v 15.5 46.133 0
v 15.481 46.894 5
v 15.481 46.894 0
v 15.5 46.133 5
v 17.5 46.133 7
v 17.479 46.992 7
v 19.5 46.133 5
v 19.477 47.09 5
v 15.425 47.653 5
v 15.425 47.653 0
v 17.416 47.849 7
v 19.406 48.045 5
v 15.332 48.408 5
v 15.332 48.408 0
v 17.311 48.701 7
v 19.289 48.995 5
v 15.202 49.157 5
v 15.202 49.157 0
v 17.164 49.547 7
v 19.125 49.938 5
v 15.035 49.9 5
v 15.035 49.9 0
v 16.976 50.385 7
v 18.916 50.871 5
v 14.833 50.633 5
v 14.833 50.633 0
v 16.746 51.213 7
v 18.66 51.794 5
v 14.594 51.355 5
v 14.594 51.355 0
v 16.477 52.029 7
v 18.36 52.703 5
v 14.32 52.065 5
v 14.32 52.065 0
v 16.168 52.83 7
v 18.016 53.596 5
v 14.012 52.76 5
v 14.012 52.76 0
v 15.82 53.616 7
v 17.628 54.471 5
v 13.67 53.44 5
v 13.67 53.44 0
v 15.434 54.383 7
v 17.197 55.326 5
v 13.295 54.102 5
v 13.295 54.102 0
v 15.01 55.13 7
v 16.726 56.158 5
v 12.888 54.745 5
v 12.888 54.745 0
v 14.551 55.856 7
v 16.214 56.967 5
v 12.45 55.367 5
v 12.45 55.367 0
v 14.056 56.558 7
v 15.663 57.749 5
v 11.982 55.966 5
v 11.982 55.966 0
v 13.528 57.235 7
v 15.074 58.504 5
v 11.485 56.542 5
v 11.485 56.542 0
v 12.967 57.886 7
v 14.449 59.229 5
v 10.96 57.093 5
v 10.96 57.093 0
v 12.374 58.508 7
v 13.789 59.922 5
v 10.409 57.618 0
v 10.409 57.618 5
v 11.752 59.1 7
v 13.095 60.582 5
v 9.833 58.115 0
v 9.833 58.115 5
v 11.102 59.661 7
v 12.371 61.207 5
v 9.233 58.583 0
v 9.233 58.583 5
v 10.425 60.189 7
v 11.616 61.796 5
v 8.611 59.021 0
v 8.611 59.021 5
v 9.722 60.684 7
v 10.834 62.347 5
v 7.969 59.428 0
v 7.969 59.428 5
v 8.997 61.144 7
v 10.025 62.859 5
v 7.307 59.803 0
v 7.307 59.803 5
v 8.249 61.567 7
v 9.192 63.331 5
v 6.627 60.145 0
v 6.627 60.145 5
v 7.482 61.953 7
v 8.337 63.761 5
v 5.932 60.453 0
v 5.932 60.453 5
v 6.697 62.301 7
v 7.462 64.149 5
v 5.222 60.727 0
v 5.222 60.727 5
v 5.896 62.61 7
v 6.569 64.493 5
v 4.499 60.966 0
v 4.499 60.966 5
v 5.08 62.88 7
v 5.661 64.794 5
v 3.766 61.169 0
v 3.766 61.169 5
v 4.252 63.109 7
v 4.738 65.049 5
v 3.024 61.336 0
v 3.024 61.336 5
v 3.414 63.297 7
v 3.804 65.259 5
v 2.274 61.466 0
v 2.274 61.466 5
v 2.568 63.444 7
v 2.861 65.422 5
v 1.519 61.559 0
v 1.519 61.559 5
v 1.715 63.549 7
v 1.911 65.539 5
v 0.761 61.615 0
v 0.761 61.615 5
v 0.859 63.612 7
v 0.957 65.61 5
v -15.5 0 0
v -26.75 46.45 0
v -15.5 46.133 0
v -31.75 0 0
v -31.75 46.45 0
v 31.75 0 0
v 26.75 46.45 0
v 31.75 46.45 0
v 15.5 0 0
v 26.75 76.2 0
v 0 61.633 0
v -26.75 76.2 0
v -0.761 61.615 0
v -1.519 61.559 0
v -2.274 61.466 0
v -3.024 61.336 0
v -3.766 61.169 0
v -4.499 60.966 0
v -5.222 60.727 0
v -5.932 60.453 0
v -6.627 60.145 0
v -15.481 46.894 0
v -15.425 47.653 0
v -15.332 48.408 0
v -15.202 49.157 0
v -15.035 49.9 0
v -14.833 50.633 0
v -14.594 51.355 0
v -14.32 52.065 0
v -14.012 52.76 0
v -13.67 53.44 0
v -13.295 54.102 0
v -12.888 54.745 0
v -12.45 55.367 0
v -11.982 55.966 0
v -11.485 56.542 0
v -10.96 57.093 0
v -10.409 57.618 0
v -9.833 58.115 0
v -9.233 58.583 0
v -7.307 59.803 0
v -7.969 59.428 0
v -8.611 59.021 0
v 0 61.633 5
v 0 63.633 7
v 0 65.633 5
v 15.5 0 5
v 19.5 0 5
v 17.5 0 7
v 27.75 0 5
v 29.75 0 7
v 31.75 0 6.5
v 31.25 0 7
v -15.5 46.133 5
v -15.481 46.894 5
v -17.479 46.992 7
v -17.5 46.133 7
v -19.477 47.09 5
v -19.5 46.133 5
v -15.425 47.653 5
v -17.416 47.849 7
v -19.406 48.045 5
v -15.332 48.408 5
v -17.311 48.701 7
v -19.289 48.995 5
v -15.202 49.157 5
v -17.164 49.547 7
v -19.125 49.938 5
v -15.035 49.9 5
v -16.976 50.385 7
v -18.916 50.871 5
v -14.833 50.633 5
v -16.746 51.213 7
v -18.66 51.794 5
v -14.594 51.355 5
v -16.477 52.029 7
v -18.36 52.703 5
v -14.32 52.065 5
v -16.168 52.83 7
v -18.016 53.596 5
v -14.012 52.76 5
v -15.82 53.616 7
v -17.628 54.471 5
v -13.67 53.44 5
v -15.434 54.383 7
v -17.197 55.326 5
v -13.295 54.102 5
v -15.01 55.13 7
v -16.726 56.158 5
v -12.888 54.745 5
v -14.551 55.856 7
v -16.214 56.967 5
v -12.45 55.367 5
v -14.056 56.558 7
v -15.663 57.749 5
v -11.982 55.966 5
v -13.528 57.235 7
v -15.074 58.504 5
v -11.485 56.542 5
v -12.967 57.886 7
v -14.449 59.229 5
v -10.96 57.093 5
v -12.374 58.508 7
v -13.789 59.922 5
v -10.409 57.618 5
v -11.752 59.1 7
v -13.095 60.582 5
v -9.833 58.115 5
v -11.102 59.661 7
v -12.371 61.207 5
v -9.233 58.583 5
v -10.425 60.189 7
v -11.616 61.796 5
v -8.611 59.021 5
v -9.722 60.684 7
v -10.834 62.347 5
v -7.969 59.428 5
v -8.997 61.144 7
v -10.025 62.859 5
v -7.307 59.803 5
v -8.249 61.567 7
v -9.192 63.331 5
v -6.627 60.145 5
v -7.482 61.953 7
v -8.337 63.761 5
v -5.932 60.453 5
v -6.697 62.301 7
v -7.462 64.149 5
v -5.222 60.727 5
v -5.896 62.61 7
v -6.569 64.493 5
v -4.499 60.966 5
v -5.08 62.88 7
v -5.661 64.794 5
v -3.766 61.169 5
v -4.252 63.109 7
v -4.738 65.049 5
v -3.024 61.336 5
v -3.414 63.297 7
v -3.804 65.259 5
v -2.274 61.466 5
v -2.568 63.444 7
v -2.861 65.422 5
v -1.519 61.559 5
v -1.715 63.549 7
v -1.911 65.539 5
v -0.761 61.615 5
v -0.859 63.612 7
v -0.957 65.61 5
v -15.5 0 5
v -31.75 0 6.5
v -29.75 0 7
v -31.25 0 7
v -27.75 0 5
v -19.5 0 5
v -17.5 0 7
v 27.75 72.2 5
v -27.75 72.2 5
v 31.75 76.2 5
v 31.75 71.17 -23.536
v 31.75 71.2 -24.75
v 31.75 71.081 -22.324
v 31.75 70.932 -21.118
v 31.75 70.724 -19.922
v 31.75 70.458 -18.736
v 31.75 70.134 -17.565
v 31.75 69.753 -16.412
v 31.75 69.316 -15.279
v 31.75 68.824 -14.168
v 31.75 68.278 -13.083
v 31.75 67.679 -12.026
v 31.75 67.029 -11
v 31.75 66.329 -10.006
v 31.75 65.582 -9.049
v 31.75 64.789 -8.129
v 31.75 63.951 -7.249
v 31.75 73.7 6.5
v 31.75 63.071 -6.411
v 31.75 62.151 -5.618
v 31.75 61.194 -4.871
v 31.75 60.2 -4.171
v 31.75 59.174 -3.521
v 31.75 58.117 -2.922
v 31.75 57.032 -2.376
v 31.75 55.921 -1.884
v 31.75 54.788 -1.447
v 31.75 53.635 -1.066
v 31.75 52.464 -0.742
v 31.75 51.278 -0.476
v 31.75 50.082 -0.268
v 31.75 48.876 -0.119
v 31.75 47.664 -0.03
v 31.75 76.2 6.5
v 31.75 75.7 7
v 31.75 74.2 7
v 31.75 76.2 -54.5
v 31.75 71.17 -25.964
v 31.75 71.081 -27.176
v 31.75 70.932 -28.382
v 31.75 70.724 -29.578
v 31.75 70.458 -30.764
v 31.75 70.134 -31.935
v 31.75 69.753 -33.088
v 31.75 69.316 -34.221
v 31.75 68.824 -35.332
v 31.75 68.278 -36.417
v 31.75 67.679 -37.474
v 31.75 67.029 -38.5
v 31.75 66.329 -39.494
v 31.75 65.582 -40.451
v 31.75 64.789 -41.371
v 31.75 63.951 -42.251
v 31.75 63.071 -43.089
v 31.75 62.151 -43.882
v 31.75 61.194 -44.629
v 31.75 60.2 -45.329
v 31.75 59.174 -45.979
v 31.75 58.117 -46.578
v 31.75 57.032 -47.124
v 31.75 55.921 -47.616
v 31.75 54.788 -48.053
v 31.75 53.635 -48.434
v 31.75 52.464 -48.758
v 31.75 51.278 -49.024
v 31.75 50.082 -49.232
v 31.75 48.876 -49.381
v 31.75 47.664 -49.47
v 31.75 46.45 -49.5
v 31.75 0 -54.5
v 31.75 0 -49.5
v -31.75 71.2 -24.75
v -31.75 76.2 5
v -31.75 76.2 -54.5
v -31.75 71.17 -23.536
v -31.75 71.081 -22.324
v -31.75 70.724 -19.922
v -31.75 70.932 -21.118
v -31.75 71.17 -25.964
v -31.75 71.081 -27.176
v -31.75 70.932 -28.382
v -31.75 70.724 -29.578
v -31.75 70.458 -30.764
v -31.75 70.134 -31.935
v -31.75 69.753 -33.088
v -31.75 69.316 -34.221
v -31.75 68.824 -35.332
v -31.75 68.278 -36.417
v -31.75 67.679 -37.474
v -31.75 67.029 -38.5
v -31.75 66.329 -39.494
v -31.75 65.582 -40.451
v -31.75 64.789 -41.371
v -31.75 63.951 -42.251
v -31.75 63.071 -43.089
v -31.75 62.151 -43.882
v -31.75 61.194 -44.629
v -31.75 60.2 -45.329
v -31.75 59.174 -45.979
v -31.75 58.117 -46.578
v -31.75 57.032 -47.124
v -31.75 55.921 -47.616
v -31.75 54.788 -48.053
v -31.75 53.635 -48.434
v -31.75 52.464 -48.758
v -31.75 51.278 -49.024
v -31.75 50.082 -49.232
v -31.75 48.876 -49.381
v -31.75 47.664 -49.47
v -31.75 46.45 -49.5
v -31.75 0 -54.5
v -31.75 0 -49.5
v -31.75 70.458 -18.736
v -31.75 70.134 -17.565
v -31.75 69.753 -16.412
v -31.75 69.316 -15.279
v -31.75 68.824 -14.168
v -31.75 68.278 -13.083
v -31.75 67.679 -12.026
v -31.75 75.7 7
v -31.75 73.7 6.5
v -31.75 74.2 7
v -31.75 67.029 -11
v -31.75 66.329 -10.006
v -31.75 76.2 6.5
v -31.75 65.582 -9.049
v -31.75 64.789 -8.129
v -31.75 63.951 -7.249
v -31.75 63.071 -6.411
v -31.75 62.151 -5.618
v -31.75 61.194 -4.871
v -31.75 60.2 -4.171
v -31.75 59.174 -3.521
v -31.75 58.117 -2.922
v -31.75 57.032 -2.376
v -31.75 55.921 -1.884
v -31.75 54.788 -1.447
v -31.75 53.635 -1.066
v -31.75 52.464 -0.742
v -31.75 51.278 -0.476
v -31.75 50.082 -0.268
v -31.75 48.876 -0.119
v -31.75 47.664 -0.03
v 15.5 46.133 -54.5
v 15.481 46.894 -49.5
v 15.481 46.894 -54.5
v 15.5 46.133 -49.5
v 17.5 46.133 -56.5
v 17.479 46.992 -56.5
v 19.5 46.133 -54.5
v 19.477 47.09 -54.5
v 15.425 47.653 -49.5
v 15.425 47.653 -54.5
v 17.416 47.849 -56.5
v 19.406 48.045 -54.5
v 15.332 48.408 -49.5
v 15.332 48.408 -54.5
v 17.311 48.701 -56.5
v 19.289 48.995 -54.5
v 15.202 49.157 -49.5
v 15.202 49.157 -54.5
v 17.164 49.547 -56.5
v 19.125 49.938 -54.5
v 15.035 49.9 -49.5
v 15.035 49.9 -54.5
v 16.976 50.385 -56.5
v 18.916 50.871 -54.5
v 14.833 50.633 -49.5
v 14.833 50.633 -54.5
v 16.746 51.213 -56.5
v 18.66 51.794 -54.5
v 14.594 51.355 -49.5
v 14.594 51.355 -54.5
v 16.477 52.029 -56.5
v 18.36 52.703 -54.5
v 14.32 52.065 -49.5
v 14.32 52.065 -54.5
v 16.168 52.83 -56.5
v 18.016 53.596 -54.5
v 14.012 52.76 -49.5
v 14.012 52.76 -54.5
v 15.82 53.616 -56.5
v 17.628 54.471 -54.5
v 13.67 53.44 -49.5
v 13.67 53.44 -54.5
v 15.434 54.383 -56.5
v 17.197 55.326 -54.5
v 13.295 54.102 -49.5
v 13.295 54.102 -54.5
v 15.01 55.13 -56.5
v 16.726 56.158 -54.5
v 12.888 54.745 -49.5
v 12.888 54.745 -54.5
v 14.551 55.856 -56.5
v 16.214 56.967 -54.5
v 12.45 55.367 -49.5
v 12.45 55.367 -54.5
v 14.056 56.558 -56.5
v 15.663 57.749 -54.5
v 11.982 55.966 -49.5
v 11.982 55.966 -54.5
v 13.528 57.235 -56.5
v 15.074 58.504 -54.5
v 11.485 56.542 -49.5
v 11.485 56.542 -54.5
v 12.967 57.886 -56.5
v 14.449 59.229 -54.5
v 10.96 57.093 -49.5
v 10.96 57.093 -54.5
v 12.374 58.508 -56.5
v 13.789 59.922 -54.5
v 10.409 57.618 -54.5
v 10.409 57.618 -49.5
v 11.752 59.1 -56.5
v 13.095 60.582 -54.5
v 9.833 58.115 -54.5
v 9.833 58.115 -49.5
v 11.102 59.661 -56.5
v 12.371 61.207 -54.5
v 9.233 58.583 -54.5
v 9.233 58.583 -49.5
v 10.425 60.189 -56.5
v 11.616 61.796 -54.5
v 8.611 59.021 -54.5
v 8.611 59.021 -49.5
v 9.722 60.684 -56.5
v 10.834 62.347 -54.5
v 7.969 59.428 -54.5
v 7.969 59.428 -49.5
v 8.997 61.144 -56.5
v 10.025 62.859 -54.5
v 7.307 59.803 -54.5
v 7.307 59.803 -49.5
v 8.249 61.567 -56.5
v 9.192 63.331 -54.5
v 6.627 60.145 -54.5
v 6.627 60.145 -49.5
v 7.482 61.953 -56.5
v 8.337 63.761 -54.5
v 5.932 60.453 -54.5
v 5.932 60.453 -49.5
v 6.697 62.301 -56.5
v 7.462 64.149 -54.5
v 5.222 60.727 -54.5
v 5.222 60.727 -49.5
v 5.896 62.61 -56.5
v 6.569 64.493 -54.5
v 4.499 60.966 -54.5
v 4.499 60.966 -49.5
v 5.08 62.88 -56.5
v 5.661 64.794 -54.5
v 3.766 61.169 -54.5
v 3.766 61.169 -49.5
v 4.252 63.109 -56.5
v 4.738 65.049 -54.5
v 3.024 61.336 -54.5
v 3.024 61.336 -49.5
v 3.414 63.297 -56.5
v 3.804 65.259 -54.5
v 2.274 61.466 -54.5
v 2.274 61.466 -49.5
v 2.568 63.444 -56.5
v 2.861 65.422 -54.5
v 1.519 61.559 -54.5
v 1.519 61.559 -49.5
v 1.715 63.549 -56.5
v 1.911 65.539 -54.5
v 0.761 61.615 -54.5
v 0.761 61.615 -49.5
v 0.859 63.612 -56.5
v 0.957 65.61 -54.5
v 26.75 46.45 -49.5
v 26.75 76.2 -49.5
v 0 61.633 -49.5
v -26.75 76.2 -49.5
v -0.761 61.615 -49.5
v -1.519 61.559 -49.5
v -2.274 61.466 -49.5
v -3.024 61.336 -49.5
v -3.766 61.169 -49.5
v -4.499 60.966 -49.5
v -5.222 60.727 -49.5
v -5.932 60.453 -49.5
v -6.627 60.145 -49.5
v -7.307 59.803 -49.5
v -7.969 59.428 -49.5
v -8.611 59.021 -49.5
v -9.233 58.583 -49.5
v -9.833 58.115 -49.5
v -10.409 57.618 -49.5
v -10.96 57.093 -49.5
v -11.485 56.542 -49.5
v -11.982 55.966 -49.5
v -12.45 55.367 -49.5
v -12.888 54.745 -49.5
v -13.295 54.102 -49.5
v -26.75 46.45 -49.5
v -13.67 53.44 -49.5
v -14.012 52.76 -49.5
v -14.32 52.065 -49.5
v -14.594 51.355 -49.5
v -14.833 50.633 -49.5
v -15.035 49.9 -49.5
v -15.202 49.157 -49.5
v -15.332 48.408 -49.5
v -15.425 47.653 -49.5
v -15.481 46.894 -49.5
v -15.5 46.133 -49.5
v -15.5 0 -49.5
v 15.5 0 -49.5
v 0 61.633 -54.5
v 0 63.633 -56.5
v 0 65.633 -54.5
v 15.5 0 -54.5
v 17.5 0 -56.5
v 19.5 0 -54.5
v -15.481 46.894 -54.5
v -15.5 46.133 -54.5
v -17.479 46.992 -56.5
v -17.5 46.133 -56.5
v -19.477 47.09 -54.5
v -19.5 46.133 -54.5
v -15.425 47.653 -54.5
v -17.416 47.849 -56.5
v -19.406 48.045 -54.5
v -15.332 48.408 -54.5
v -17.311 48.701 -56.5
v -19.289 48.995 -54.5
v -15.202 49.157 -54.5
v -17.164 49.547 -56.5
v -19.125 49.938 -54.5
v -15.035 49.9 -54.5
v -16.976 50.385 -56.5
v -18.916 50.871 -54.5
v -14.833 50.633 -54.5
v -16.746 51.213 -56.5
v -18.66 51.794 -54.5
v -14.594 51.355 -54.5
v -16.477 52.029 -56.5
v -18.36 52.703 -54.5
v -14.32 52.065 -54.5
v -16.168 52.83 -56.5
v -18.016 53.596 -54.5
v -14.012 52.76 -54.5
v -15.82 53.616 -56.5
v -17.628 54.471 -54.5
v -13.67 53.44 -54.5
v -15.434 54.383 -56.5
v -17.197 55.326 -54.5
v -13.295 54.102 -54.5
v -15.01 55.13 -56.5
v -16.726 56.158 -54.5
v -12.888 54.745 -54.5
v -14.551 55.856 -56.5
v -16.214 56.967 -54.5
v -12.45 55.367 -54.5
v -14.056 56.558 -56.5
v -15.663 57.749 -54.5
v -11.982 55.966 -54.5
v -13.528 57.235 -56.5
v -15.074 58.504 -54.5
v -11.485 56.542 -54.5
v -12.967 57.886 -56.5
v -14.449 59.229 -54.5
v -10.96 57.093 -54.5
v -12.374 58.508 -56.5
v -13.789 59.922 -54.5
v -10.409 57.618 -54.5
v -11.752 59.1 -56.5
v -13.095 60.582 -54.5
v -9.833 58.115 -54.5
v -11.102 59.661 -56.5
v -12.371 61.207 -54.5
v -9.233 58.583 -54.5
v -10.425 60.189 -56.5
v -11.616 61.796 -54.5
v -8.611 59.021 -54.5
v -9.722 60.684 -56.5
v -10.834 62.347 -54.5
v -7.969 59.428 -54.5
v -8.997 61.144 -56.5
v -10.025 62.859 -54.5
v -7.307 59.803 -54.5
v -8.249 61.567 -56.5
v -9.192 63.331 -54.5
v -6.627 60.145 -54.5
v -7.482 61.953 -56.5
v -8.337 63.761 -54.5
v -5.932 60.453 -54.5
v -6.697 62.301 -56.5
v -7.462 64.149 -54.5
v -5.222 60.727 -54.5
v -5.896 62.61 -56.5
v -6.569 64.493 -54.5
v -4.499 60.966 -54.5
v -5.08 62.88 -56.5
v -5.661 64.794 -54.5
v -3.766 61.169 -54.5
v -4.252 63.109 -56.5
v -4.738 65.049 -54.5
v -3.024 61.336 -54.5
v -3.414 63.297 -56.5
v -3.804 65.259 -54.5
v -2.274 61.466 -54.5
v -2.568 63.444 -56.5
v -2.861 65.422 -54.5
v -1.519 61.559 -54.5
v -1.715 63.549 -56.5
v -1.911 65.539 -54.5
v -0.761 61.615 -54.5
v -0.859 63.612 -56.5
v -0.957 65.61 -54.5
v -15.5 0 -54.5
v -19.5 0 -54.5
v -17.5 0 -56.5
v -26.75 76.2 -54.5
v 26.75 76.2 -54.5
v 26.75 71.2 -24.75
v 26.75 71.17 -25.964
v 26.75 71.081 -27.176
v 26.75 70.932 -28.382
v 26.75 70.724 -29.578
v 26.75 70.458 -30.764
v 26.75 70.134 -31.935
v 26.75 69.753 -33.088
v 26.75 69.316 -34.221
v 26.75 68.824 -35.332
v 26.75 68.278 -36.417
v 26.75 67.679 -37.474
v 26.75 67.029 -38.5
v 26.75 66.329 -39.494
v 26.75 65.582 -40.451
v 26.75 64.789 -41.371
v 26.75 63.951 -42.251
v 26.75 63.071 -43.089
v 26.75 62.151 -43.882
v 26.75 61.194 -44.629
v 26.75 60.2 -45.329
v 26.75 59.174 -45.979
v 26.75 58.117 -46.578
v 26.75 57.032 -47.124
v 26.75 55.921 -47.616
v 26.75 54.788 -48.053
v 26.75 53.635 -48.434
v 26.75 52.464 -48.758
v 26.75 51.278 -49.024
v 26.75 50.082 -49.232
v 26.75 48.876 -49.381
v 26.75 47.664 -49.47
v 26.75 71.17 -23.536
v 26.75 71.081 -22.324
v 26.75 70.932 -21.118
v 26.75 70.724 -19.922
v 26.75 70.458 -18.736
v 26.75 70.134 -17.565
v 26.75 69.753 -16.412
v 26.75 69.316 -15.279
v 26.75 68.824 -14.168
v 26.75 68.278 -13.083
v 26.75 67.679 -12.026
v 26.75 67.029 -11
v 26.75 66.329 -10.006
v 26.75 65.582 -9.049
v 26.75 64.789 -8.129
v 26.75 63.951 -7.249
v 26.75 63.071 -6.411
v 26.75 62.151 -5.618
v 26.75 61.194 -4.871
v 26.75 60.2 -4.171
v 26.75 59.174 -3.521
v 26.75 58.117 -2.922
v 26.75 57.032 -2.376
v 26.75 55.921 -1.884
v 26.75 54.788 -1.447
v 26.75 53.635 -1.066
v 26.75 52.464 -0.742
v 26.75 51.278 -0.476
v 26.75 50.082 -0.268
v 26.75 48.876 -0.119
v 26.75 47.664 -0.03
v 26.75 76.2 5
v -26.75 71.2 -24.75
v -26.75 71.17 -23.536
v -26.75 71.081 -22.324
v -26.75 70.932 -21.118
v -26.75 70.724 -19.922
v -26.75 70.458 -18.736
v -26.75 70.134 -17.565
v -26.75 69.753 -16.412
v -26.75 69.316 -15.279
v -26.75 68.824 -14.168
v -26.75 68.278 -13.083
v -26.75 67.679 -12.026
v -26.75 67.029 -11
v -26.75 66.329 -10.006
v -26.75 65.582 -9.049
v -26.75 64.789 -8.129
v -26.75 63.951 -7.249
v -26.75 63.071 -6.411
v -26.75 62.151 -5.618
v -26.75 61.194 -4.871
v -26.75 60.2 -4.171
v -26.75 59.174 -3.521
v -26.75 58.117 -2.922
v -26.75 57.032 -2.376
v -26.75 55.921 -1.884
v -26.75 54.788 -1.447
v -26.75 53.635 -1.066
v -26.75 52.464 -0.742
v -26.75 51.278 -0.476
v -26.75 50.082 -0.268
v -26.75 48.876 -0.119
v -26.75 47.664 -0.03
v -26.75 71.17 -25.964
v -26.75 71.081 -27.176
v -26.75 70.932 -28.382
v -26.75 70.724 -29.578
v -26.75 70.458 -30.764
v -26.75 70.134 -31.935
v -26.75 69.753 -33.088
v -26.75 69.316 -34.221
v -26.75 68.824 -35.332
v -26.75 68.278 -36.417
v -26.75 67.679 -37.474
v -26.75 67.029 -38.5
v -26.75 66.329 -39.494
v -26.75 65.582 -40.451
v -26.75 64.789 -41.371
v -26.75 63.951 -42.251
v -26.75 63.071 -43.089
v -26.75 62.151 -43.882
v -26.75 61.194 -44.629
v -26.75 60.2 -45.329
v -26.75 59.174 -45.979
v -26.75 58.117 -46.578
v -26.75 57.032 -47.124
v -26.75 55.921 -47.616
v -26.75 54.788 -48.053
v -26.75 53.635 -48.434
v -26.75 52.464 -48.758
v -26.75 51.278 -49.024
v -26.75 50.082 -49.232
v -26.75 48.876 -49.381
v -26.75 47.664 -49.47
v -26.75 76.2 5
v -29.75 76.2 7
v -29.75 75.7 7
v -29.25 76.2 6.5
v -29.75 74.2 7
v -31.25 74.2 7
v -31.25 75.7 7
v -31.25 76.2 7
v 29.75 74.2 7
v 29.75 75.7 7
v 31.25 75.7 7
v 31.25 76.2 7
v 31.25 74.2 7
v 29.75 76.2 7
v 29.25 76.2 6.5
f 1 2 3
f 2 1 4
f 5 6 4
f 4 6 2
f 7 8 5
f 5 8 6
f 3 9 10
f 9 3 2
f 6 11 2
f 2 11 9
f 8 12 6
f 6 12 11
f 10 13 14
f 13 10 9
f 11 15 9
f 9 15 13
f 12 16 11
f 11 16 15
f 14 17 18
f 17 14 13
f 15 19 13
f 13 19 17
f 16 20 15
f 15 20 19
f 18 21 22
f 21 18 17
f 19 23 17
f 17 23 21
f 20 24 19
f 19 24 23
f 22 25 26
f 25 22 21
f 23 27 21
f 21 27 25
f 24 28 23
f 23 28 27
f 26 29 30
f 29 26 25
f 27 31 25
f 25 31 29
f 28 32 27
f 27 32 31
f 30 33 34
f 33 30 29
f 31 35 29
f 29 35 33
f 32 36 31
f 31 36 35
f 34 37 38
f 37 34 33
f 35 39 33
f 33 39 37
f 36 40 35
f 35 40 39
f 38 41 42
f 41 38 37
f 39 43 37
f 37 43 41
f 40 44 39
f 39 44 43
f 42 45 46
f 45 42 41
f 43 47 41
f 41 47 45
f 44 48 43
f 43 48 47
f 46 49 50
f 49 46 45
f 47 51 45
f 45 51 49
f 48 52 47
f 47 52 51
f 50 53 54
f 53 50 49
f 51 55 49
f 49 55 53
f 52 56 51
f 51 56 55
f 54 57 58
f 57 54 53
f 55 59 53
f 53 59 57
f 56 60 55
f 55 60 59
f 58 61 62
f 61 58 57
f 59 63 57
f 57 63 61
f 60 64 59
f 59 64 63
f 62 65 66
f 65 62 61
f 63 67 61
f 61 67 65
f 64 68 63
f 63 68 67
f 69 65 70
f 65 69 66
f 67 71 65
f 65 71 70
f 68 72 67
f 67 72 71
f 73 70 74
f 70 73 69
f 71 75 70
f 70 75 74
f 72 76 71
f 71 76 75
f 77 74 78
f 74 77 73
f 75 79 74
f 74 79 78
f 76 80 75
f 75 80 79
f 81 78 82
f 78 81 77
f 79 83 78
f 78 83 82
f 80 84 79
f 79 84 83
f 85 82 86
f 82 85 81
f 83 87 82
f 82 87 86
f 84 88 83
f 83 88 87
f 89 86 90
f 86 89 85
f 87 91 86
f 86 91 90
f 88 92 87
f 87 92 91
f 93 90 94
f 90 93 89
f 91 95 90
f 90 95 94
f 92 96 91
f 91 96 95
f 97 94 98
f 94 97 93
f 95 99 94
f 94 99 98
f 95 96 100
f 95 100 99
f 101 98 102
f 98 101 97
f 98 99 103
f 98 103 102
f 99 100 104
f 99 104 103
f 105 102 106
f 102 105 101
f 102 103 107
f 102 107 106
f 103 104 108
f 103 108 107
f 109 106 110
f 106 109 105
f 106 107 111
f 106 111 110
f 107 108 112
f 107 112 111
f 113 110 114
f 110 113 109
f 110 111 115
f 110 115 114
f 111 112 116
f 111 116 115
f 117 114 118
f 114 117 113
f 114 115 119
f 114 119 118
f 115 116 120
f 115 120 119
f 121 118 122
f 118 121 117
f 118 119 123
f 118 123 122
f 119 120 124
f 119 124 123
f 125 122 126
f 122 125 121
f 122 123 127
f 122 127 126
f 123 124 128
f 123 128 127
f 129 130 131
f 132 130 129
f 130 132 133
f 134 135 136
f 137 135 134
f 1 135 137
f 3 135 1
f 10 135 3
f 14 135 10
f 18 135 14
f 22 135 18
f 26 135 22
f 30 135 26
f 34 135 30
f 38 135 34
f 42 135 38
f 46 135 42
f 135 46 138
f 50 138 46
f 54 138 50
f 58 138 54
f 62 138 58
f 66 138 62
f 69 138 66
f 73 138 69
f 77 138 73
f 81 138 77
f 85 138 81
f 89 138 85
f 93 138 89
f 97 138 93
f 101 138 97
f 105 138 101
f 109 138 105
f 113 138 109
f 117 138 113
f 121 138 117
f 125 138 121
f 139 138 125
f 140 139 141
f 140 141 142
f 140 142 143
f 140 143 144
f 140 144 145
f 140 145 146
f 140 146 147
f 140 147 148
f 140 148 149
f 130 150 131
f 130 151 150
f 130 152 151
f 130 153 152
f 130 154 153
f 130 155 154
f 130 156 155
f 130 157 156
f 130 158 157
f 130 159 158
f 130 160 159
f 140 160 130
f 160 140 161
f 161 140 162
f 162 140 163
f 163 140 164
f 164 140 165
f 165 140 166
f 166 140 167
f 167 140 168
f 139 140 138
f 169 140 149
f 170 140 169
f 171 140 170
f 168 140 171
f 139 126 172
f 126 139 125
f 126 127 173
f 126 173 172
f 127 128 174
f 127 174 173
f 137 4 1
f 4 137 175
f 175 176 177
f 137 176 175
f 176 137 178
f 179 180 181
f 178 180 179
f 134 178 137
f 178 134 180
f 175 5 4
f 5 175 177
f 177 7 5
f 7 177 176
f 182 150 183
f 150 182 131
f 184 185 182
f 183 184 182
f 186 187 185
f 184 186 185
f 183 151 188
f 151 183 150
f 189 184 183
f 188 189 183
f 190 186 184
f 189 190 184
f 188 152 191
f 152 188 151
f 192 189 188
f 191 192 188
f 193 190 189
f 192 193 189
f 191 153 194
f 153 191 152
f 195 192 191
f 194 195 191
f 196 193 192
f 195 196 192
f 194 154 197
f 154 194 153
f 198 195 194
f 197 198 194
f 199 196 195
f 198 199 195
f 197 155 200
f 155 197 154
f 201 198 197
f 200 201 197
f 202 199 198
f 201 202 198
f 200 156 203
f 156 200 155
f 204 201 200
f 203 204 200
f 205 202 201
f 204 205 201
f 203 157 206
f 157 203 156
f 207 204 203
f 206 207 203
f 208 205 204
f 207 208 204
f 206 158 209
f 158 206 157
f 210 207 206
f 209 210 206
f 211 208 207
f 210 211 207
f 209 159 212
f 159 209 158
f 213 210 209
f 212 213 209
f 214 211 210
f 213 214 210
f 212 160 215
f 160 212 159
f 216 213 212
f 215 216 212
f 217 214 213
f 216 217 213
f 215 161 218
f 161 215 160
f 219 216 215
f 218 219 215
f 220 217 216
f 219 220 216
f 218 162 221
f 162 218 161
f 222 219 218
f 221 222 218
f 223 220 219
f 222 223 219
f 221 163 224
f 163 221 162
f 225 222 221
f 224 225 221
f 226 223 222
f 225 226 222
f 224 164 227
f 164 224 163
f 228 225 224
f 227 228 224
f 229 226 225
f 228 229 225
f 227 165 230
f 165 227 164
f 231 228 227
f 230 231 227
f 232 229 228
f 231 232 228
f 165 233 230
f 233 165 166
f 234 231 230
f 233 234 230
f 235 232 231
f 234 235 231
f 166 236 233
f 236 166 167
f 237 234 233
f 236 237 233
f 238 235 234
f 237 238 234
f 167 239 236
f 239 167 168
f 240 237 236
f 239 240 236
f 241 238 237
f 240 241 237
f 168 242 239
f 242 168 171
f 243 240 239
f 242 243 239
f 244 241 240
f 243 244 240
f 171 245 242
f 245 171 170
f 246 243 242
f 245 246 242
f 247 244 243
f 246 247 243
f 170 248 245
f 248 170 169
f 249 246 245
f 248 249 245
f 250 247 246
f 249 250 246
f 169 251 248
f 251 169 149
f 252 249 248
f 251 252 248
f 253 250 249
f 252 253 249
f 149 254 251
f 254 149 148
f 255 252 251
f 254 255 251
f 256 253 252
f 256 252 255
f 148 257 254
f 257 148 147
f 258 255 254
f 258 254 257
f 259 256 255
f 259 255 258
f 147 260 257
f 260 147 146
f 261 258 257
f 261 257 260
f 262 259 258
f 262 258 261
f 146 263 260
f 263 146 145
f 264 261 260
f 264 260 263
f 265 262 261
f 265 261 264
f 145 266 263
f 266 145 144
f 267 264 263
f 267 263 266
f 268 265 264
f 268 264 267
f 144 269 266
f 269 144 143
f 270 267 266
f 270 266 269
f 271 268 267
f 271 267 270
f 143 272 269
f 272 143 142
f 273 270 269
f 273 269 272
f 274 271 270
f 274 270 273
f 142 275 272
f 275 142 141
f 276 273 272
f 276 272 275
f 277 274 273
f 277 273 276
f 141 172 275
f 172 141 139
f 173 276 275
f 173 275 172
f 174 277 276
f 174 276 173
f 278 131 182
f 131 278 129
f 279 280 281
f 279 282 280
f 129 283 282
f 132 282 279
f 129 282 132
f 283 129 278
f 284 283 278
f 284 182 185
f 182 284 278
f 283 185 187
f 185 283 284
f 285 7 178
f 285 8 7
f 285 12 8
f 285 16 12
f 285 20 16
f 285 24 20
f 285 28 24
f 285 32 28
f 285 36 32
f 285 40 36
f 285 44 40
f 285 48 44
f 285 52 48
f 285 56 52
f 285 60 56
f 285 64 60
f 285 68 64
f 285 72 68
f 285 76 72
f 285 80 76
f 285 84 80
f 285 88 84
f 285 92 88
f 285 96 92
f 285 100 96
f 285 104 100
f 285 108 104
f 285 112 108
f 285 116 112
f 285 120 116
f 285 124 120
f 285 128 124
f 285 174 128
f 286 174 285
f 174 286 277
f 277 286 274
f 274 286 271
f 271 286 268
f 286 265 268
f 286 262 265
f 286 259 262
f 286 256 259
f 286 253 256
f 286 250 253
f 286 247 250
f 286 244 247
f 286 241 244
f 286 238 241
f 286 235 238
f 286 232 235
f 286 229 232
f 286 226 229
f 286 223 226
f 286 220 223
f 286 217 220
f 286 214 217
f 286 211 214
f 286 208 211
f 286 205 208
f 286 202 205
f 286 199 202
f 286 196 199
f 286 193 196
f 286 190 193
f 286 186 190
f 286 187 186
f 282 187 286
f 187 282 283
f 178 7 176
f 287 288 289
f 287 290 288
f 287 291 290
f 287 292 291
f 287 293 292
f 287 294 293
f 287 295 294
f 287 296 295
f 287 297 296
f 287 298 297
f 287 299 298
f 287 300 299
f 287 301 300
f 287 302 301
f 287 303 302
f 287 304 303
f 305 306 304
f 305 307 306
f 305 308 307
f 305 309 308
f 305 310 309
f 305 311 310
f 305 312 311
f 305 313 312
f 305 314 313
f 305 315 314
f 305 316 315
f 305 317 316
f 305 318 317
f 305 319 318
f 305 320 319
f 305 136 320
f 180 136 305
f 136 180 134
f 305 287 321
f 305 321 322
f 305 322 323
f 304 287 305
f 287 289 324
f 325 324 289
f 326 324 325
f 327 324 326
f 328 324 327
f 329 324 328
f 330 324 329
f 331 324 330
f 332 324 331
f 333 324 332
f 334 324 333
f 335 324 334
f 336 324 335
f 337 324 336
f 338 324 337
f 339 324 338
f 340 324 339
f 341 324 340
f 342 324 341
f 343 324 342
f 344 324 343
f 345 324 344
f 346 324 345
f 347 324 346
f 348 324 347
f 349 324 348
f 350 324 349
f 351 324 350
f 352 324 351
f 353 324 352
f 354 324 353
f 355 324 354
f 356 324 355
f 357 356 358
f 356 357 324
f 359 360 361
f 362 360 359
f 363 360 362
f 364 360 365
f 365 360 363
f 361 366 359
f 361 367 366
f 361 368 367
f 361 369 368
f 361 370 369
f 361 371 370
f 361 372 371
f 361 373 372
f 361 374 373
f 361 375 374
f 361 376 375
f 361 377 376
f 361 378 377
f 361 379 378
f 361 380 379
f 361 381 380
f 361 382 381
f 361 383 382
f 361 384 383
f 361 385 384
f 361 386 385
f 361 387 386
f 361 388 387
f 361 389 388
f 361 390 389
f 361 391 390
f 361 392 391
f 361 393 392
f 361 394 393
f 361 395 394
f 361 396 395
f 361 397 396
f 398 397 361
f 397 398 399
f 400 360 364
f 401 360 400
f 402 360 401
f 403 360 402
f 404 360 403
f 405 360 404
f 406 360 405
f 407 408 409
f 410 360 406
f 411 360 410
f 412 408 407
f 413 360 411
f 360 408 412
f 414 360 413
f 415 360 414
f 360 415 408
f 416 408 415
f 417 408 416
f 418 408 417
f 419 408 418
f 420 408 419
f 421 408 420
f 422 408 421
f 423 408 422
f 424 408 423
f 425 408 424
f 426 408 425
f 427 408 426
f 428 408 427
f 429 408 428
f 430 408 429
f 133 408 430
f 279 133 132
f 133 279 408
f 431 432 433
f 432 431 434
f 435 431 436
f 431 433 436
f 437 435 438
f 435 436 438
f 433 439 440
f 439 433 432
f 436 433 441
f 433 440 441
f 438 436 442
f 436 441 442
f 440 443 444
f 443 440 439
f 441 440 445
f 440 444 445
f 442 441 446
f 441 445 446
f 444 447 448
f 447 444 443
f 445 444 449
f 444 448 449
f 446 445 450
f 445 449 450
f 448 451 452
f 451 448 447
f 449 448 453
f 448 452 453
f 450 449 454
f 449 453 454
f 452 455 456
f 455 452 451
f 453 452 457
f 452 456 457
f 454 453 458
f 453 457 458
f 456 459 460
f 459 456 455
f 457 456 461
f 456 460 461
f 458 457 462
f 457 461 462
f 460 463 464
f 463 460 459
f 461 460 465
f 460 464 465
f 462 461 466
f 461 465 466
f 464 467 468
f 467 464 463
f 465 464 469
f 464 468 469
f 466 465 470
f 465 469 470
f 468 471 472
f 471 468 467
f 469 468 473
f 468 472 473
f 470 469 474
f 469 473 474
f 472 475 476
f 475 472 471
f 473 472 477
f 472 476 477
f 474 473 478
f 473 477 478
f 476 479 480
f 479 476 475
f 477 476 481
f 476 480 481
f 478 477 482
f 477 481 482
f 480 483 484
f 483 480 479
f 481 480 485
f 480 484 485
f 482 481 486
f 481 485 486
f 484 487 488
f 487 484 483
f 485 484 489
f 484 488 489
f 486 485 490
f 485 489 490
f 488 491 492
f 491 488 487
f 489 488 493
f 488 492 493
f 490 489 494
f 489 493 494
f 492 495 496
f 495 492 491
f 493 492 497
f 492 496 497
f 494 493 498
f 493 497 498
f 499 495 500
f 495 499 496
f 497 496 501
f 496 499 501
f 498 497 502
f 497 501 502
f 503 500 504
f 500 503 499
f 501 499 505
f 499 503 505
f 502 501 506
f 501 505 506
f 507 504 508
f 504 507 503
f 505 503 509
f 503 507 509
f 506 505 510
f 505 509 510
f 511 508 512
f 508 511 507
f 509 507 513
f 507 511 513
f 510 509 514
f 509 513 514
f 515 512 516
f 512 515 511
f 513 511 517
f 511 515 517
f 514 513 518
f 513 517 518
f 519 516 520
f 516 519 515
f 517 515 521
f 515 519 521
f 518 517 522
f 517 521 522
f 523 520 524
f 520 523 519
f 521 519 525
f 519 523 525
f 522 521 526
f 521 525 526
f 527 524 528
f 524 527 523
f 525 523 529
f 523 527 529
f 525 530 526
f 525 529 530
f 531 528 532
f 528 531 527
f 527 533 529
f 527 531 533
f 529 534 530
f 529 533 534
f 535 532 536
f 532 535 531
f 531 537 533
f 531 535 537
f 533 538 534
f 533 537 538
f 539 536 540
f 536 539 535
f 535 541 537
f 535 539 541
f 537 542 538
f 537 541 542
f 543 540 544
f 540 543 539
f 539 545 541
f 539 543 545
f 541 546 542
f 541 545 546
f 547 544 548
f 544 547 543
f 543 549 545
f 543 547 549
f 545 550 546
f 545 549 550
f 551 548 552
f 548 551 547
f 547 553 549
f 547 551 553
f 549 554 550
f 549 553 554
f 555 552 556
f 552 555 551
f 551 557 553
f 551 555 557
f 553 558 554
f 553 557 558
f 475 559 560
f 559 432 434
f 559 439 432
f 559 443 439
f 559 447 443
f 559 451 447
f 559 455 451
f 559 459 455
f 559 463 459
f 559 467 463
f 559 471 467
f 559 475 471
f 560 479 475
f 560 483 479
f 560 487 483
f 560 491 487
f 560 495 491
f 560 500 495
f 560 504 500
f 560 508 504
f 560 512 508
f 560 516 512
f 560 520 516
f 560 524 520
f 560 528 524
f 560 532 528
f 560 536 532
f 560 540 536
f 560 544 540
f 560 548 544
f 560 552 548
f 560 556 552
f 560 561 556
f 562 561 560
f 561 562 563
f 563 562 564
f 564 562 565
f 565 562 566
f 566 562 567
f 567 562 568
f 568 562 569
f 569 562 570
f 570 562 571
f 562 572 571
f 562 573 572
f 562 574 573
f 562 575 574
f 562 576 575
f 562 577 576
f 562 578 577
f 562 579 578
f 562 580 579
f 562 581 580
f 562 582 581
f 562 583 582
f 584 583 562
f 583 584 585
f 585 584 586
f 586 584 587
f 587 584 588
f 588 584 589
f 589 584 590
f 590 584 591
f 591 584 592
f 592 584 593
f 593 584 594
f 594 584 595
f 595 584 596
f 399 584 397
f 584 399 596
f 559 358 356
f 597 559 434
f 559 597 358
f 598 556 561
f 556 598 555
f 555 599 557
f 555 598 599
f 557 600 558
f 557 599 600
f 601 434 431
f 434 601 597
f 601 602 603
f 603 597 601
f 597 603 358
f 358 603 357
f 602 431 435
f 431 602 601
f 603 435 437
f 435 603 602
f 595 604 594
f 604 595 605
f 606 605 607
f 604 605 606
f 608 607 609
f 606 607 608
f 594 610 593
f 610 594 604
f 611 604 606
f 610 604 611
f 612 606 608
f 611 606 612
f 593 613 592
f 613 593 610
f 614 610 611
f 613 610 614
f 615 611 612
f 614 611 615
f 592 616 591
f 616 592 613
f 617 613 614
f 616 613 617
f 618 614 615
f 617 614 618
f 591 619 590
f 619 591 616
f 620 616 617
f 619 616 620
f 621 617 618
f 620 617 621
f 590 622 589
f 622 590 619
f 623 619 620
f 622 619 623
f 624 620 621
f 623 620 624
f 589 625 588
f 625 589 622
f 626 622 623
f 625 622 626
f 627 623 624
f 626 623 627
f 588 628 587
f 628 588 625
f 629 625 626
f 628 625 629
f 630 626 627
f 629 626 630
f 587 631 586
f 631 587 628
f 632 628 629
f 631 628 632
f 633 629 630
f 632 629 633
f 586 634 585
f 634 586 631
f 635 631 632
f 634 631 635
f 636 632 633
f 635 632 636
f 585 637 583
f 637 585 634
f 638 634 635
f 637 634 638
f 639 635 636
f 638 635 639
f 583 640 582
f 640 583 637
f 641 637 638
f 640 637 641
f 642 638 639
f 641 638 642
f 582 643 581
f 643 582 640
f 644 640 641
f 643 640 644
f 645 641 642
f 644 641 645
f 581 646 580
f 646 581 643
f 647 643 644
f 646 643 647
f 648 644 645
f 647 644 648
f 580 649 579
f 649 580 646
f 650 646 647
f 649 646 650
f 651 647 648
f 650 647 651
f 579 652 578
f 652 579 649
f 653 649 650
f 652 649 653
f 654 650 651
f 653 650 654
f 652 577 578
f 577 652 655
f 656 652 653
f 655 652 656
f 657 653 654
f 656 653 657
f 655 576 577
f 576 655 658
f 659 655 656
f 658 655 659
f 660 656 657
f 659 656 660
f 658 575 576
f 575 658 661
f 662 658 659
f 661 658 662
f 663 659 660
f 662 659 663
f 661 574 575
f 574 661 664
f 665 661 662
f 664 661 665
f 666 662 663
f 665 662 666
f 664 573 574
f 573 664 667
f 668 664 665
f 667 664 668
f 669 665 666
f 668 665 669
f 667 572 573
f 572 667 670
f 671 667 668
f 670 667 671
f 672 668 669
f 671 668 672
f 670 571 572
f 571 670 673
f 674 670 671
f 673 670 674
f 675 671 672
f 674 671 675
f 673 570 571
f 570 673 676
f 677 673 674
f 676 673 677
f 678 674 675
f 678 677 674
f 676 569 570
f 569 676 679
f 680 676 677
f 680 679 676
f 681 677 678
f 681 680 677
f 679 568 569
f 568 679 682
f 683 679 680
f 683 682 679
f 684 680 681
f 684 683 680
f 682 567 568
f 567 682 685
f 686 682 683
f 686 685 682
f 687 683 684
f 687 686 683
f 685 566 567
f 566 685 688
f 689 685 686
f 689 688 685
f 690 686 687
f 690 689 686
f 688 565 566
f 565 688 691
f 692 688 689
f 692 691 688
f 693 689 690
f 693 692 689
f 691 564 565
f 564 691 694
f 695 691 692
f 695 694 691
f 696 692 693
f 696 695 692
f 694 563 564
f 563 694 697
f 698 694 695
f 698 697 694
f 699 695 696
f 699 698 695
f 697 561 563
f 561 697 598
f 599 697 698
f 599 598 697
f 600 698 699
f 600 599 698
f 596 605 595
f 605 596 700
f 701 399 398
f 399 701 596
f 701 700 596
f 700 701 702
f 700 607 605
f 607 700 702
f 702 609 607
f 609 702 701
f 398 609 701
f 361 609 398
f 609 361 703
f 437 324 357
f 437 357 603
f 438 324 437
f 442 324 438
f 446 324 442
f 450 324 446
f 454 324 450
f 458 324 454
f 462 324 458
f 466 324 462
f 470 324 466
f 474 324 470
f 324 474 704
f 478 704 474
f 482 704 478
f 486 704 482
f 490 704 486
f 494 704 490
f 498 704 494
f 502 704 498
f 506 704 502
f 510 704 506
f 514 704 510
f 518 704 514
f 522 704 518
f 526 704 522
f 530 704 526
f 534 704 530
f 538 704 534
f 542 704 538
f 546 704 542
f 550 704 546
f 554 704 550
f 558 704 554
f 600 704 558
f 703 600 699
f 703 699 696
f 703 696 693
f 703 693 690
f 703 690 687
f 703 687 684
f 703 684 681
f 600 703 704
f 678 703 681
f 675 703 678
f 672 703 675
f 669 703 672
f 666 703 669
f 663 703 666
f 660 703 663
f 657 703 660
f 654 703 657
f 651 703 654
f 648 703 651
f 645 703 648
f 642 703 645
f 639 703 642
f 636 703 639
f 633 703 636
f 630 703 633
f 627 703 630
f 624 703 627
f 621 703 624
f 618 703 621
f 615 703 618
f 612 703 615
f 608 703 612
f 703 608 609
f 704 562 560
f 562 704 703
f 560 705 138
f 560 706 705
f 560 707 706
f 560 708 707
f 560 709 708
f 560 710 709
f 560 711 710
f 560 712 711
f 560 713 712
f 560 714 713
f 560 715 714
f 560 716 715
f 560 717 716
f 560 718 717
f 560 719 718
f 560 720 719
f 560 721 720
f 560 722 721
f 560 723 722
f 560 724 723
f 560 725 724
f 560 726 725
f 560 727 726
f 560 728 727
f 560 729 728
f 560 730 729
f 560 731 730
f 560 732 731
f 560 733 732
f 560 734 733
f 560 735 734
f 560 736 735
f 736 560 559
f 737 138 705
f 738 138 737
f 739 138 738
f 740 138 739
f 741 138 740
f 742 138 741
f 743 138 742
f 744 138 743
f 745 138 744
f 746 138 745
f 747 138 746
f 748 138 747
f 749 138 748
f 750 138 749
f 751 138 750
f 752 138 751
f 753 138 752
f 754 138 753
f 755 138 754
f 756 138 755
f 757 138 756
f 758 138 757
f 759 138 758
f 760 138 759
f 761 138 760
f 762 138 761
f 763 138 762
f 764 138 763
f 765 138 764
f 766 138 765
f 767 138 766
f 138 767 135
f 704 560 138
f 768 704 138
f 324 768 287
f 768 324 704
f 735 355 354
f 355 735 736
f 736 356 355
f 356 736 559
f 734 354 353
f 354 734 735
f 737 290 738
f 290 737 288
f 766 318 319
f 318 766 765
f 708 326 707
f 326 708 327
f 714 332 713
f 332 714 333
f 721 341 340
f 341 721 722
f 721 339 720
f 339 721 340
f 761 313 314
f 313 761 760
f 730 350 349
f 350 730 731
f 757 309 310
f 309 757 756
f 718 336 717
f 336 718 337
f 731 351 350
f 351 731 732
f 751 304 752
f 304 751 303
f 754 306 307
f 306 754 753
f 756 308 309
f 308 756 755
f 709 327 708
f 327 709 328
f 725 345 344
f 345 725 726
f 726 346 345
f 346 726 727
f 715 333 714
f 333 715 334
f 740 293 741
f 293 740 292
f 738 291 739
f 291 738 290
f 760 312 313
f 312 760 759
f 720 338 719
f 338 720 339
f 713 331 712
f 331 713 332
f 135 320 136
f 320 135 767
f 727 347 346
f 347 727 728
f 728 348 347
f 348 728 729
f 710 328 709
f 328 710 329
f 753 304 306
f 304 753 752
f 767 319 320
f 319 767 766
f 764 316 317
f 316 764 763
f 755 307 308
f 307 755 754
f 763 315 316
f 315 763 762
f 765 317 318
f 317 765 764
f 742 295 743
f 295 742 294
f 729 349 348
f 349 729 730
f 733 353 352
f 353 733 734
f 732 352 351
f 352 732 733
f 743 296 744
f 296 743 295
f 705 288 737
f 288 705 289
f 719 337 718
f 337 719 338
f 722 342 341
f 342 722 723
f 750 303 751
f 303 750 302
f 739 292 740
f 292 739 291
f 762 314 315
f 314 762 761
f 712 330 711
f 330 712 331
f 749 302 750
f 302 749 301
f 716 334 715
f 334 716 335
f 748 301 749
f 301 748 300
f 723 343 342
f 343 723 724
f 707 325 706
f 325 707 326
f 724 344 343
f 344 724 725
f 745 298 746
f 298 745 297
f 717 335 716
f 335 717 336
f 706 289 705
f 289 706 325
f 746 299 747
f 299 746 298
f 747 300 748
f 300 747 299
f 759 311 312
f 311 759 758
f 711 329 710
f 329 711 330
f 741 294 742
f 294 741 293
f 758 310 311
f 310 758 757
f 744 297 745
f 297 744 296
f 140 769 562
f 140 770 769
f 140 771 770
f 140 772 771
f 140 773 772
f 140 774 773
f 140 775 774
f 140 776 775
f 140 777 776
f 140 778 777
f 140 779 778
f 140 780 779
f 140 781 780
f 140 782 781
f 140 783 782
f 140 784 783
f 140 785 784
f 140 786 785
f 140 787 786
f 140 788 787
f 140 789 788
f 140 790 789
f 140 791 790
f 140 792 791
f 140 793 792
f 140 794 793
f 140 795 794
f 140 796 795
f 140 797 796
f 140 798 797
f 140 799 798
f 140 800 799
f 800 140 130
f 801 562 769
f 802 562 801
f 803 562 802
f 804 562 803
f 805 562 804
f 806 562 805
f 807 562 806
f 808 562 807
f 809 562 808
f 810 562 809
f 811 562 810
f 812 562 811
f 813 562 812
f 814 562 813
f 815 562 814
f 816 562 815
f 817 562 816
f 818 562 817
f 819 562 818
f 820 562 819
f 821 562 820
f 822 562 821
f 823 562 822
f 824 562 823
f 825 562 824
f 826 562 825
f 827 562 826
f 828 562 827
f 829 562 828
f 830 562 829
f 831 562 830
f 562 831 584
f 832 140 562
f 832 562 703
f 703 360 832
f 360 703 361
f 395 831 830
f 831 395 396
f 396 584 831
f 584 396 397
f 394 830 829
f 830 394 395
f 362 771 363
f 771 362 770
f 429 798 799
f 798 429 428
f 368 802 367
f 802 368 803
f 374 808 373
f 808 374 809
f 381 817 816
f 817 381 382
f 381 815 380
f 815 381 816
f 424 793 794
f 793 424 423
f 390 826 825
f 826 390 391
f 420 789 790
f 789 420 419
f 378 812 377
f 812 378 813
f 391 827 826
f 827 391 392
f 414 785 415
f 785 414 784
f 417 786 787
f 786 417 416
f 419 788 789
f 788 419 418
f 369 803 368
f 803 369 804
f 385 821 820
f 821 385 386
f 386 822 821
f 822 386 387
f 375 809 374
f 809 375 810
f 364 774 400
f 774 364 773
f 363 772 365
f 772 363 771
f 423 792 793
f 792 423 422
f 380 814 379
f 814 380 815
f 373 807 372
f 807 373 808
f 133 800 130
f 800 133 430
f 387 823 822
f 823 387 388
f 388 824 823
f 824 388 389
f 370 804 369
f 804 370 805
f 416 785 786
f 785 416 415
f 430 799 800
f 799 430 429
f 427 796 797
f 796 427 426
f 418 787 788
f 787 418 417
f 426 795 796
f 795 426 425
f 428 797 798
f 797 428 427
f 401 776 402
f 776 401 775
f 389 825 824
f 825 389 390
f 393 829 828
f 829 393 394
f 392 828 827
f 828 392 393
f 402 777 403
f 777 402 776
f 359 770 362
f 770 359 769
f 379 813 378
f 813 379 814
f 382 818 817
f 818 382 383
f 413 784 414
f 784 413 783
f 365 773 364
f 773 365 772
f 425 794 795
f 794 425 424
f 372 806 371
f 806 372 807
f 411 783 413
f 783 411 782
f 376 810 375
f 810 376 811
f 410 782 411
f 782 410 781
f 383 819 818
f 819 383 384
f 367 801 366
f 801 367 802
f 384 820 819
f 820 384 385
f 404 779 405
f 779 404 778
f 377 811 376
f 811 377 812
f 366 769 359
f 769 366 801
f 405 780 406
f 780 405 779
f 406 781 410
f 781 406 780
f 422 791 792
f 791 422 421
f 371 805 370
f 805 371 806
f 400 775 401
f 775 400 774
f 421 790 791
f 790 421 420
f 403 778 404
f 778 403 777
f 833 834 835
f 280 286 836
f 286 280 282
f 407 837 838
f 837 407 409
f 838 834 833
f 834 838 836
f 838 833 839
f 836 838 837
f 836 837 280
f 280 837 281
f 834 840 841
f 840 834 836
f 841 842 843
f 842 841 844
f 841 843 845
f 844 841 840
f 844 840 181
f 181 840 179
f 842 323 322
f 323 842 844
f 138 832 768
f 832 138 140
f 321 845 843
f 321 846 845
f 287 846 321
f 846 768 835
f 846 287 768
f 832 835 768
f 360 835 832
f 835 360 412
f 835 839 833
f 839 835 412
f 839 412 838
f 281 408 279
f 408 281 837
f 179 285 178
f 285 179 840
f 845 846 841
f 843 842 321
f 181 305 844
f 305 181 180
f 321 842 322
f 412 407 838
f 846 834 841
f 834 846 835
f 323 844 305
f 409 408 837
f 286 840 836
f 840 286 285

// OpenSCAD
// file: modules.scad
use <constants.scad>
// house_silhouette: five-sided house shape extruded to depth d
// e = length of the three orthogonal sides (square base)
// r = roof rise (height of apex above the top of the square)
module house_silhouette(trim_parameters) {
    w = trim_width(trim_parameters);
    h = trim_height(trim_parameters);
    p = trim_peak(trim_parameters);
    polygon(points = [
        [-w / 2,   0      ],  // bottom-left
        [ w / 2,   0      ],  // bottom-right
        [ w / 2,   h      ],  // top-right
        [ 0,       h + p  ],  // apex
        [-w / 2,   h      ],  // top-left
    ]);
}

module house_silhouette_rotated(trim_parameters, radius = 0) {
    rotate_extrude(angle = 90)
        translate([radius, 0])
            house_silhouette(trim_parameters);
}


module transition_silhouette(trim_parameters) {
    w = trim_width(trim_parameters);
    h = trim_height(trim_parameters);
    p = trim_peak(trim_parameters);
    polygon(points = [
        [-w / 2,   0      ],  // bottom-left
        [ w / 2,   0      ],  // bottom-right
        [ w / 2,   h      ],  // top-right
        [ 0,       h + p   ],  // apex
        [-w / 2 + 0.5,   h + p],  // top-left
        [-w / 2,   h + p - 0.5],  // top-left
    ]);
}

module door_negative(parameters) {

    fh = opening_frame_height(parameters);
    ow = opening_width(parameters);

    translate([0, fh, 0])
    circle(r = opening_width(parameters)/2);

    translate([0, fh/2, 0])
    square([ow, fh], center=true);

}

module wall_segment(wall_parameters, opening_parameters, trim_parameters) {

    wt = wall_thickness(wall_parameters);    
    wh = wall_height(wall_parameters);
    ww = wall_width(wall_parameters);

    linear_extrude(wt)
    difference() {
        translate([0, wh/2, 0])
        square([ww, wh], center=true);    
        door_negative(opening_parameters);
    }


    door_frame(opening_parameters, trim_parameters);

}

module door_frame_half(opening_parameters, trim_parameters) {

    oh = opening_height(opening_parameters);
    oah = opening_arch_height(opening_parameters);
    ow = opening_width(opening_parameters);
    ofh = opening_frame_height(opening_parameters);

    translate([0, oh-oah, 0])
    house_silhouette_rotated(trim_parameters, ow/2);

    translate([ow/2, oh/3 * 2, 0])
    rotate([90, 90, 0])
    rotate([0, 0, 90])
    linear_extrude(ofh)
    house_silhouette(trim_parameters);

}

module door_frame(opening_parameters, trim_parameters) {
    door_frame_half(opening_parameters, trim_parameters);
    mirror([1, 0, 0]) door_frame_half(opening_parameters, trim_parameters);
}

module interior_arc(interior_arc_parameters) {
    d = interior_arc_diameter(interior_arc_parameters);
    f = interior_arc_frame(interior_arc_parameters);

    cube([f, d/2, 5], center=true);
 
}


module internior_arches (p, w) {

    width = interior_arch_frame_width(p);
    height = interior_arch_frame_height(p);
    thickness = interior_arch_frame_thickness(p);
    diameter = interior_arch_diameter(p);
    radius = diameter / 2;

    translate([wall_width(w)/2 - thickness/2, wall_height(w) - height, -radius])
    rotate([0, 90, 0])
    difference() {
        translate([-width/2, 0, -thickness/2])
        cube([width, height, thickness]);
        cylinder(r=radius, h=thickness + 2, center=true);
    }

    translate([-wall_width(w)/2 + thickness/2, wall_height(w) - height, -radius])
    rotate([0, 90, 0])
    difference() {
        translate([-width/2, 0, -thickness/2])
        cube([width, height, thickness]);
        cylinder(r=radius, h=thickness + 2, center=true);
    }


}
// file: constants.scad
$fn = $preview ? 32 : 128;

inches_to_mm = 25.4;
cell_edge = 2.5 * inches_to_mm;

echo("Cell edge:", cell_edge);

wall_width = cell_edge;
wall_thickness = 5;
wall_height = 3 * inches_to_mm;

// wall struct: [width, thickness, height]
WALL_WIDTH     = 0;
WALL_THICKNESS = 1;
WALL_HEIGHT    = 2;

function make_wall(width, thickness, height) = [width, thickness, height];

function wall_width(w)     = w[WALL_WIDTH];
function wall_thickness(w) = w[WALL_THICKNESS];
function wall_height(w)    = w[WALL_HEIGHT];

wall_parameters = make_wall(wall_width, wall_thickness, wall_height);

trim_width = 4;
trim_height = wall_thickness;
trim_peak = 2;

// trim struct: [width, height]
TRIM_WIDTH  = 0;
TRIM_HEIGHT = 1;
TRIM_PEAK = 2;

function make_trim(width, height, peak) = [width, height, peak];

function trim_width(t)  = t[TRIM_WIDTH];
function trim_height(t) = t[TRIM_HEIGHT];
function trim_peak(t) = t[TRIM_PEAK];

trim_parameters = make_trim(trim_width, trim_height, trim_peak);

rampart_height = 7;
rampart_width = trim_width;



// based on stormcast being on 32mm
opening_width= 35;
opening_height = (wall_height - rampart_height);
opening_frame_height = opening_height * 2/3;
opening_arch_height = opening_height * 1/3;

// opening struct: [width, height, frame_height, arch_height]
// indices
OPENING_WIDTH        = 0;
OPENING_HEIGHT       = 1;
OPENING_FRAME_HEIGHT = 2;
OPENING_ARCH_HEIGHT  = 3;

function make_opening(width, height) = [
    width,
    height,
    height * 2/3,
    height * 1/3,
];

function opening_width(o)        = o[OPENING_WIDTH];
function opening_height(o)       = o[OPENING_HEIGHT];
function opening_frame_height(o) = o[OPENING_FRAME_HEIGHT];
function opening_arch_height(o)  = o[OPENING_ARCH_HEIGHT];

opening_parameters = make_opening(opening_width, opening_height);

pillar_width = cell_edge - opening_width;

walkway_width = opening_width + 2 * rampart_width;

interior_arch_diameter = 49.5;

// interior_arc struct: [diameter, frame]
INTERIOR_ARC_DIAMETER = 0;
INTERIOR_ARC_FRAME_WIDTH    = 1;
INTERIOR_ARC_FRAME_HEIGHT   = 2;
INTERIOR_ARC_FRAME_THICKNESS = 3;

function make_interior_arch(diameter, thickness) = [
    diameter,
    diameter + 2 * thickness,
    diameter /2 + thickness,
    thickness
];

function interior_arch_diameter(a) = a[INTERIOR_ARC_DIAMETER];
function interior_arch_frame_width(a)    = a[INTERIOR_ARC_FRAME_WIDTH];
function interior_arch_frame_height(a)   = a[INTERIOR_ARC_FRAME_HEIGHT];
function interior_arch_frame_thickness(a) = a[INTERIOR_ARC_FRAME_THICKNESS];

interior_arch_parameters = make_interior_arch(interior_arch_diameter, wall_thickness);
// main file
include <constants.scad>
use <modules.scad>



wall_segment(wall_parameters, opening_parameters, trim_parameters);

translate([0, 0, -cell_edge + 2* (wall_thickness(wall_parameters) + trim_peak(trim_parameters))])
mirror([0, 0, 1])
wall_segment(wall_parameters, opening_parameters, trim_parameters);


internior_arches(interior_arch_parameters, wall_parameters);


// wall alighment reference
// translate([-cell_edge/2, 0, -cell_edge + wall_thickness(wall_parameters)+ trim_peak(trim_parameters)] )
// #cube([cell_edge, 5, cell_edge], center=false);




translate([-cell_edge/2+trim_width/2, wall_height, 0])
rotate([90,0,  0])
linear_extrude(wall_height)
transition_silhouette(trim_parameters);

mirror([1, 0, 0])
translate([-cell_edge/2+trim_width/2, wall_height, 0])
rotate([90,0,  0])
linear_extrude(wall_height)
transition_silhouette(trim_parameters);

translate([-cell_edge/2, wall_height - trim_width/2, wall_thickness/2-rampart_width/2-0.5])
mirror([0, 1, 0])
rotate([90,0,  0])
rotate([0,90,  0])
linear_extrude(cell_edge)
transition_silhouette(trim_parameters);
